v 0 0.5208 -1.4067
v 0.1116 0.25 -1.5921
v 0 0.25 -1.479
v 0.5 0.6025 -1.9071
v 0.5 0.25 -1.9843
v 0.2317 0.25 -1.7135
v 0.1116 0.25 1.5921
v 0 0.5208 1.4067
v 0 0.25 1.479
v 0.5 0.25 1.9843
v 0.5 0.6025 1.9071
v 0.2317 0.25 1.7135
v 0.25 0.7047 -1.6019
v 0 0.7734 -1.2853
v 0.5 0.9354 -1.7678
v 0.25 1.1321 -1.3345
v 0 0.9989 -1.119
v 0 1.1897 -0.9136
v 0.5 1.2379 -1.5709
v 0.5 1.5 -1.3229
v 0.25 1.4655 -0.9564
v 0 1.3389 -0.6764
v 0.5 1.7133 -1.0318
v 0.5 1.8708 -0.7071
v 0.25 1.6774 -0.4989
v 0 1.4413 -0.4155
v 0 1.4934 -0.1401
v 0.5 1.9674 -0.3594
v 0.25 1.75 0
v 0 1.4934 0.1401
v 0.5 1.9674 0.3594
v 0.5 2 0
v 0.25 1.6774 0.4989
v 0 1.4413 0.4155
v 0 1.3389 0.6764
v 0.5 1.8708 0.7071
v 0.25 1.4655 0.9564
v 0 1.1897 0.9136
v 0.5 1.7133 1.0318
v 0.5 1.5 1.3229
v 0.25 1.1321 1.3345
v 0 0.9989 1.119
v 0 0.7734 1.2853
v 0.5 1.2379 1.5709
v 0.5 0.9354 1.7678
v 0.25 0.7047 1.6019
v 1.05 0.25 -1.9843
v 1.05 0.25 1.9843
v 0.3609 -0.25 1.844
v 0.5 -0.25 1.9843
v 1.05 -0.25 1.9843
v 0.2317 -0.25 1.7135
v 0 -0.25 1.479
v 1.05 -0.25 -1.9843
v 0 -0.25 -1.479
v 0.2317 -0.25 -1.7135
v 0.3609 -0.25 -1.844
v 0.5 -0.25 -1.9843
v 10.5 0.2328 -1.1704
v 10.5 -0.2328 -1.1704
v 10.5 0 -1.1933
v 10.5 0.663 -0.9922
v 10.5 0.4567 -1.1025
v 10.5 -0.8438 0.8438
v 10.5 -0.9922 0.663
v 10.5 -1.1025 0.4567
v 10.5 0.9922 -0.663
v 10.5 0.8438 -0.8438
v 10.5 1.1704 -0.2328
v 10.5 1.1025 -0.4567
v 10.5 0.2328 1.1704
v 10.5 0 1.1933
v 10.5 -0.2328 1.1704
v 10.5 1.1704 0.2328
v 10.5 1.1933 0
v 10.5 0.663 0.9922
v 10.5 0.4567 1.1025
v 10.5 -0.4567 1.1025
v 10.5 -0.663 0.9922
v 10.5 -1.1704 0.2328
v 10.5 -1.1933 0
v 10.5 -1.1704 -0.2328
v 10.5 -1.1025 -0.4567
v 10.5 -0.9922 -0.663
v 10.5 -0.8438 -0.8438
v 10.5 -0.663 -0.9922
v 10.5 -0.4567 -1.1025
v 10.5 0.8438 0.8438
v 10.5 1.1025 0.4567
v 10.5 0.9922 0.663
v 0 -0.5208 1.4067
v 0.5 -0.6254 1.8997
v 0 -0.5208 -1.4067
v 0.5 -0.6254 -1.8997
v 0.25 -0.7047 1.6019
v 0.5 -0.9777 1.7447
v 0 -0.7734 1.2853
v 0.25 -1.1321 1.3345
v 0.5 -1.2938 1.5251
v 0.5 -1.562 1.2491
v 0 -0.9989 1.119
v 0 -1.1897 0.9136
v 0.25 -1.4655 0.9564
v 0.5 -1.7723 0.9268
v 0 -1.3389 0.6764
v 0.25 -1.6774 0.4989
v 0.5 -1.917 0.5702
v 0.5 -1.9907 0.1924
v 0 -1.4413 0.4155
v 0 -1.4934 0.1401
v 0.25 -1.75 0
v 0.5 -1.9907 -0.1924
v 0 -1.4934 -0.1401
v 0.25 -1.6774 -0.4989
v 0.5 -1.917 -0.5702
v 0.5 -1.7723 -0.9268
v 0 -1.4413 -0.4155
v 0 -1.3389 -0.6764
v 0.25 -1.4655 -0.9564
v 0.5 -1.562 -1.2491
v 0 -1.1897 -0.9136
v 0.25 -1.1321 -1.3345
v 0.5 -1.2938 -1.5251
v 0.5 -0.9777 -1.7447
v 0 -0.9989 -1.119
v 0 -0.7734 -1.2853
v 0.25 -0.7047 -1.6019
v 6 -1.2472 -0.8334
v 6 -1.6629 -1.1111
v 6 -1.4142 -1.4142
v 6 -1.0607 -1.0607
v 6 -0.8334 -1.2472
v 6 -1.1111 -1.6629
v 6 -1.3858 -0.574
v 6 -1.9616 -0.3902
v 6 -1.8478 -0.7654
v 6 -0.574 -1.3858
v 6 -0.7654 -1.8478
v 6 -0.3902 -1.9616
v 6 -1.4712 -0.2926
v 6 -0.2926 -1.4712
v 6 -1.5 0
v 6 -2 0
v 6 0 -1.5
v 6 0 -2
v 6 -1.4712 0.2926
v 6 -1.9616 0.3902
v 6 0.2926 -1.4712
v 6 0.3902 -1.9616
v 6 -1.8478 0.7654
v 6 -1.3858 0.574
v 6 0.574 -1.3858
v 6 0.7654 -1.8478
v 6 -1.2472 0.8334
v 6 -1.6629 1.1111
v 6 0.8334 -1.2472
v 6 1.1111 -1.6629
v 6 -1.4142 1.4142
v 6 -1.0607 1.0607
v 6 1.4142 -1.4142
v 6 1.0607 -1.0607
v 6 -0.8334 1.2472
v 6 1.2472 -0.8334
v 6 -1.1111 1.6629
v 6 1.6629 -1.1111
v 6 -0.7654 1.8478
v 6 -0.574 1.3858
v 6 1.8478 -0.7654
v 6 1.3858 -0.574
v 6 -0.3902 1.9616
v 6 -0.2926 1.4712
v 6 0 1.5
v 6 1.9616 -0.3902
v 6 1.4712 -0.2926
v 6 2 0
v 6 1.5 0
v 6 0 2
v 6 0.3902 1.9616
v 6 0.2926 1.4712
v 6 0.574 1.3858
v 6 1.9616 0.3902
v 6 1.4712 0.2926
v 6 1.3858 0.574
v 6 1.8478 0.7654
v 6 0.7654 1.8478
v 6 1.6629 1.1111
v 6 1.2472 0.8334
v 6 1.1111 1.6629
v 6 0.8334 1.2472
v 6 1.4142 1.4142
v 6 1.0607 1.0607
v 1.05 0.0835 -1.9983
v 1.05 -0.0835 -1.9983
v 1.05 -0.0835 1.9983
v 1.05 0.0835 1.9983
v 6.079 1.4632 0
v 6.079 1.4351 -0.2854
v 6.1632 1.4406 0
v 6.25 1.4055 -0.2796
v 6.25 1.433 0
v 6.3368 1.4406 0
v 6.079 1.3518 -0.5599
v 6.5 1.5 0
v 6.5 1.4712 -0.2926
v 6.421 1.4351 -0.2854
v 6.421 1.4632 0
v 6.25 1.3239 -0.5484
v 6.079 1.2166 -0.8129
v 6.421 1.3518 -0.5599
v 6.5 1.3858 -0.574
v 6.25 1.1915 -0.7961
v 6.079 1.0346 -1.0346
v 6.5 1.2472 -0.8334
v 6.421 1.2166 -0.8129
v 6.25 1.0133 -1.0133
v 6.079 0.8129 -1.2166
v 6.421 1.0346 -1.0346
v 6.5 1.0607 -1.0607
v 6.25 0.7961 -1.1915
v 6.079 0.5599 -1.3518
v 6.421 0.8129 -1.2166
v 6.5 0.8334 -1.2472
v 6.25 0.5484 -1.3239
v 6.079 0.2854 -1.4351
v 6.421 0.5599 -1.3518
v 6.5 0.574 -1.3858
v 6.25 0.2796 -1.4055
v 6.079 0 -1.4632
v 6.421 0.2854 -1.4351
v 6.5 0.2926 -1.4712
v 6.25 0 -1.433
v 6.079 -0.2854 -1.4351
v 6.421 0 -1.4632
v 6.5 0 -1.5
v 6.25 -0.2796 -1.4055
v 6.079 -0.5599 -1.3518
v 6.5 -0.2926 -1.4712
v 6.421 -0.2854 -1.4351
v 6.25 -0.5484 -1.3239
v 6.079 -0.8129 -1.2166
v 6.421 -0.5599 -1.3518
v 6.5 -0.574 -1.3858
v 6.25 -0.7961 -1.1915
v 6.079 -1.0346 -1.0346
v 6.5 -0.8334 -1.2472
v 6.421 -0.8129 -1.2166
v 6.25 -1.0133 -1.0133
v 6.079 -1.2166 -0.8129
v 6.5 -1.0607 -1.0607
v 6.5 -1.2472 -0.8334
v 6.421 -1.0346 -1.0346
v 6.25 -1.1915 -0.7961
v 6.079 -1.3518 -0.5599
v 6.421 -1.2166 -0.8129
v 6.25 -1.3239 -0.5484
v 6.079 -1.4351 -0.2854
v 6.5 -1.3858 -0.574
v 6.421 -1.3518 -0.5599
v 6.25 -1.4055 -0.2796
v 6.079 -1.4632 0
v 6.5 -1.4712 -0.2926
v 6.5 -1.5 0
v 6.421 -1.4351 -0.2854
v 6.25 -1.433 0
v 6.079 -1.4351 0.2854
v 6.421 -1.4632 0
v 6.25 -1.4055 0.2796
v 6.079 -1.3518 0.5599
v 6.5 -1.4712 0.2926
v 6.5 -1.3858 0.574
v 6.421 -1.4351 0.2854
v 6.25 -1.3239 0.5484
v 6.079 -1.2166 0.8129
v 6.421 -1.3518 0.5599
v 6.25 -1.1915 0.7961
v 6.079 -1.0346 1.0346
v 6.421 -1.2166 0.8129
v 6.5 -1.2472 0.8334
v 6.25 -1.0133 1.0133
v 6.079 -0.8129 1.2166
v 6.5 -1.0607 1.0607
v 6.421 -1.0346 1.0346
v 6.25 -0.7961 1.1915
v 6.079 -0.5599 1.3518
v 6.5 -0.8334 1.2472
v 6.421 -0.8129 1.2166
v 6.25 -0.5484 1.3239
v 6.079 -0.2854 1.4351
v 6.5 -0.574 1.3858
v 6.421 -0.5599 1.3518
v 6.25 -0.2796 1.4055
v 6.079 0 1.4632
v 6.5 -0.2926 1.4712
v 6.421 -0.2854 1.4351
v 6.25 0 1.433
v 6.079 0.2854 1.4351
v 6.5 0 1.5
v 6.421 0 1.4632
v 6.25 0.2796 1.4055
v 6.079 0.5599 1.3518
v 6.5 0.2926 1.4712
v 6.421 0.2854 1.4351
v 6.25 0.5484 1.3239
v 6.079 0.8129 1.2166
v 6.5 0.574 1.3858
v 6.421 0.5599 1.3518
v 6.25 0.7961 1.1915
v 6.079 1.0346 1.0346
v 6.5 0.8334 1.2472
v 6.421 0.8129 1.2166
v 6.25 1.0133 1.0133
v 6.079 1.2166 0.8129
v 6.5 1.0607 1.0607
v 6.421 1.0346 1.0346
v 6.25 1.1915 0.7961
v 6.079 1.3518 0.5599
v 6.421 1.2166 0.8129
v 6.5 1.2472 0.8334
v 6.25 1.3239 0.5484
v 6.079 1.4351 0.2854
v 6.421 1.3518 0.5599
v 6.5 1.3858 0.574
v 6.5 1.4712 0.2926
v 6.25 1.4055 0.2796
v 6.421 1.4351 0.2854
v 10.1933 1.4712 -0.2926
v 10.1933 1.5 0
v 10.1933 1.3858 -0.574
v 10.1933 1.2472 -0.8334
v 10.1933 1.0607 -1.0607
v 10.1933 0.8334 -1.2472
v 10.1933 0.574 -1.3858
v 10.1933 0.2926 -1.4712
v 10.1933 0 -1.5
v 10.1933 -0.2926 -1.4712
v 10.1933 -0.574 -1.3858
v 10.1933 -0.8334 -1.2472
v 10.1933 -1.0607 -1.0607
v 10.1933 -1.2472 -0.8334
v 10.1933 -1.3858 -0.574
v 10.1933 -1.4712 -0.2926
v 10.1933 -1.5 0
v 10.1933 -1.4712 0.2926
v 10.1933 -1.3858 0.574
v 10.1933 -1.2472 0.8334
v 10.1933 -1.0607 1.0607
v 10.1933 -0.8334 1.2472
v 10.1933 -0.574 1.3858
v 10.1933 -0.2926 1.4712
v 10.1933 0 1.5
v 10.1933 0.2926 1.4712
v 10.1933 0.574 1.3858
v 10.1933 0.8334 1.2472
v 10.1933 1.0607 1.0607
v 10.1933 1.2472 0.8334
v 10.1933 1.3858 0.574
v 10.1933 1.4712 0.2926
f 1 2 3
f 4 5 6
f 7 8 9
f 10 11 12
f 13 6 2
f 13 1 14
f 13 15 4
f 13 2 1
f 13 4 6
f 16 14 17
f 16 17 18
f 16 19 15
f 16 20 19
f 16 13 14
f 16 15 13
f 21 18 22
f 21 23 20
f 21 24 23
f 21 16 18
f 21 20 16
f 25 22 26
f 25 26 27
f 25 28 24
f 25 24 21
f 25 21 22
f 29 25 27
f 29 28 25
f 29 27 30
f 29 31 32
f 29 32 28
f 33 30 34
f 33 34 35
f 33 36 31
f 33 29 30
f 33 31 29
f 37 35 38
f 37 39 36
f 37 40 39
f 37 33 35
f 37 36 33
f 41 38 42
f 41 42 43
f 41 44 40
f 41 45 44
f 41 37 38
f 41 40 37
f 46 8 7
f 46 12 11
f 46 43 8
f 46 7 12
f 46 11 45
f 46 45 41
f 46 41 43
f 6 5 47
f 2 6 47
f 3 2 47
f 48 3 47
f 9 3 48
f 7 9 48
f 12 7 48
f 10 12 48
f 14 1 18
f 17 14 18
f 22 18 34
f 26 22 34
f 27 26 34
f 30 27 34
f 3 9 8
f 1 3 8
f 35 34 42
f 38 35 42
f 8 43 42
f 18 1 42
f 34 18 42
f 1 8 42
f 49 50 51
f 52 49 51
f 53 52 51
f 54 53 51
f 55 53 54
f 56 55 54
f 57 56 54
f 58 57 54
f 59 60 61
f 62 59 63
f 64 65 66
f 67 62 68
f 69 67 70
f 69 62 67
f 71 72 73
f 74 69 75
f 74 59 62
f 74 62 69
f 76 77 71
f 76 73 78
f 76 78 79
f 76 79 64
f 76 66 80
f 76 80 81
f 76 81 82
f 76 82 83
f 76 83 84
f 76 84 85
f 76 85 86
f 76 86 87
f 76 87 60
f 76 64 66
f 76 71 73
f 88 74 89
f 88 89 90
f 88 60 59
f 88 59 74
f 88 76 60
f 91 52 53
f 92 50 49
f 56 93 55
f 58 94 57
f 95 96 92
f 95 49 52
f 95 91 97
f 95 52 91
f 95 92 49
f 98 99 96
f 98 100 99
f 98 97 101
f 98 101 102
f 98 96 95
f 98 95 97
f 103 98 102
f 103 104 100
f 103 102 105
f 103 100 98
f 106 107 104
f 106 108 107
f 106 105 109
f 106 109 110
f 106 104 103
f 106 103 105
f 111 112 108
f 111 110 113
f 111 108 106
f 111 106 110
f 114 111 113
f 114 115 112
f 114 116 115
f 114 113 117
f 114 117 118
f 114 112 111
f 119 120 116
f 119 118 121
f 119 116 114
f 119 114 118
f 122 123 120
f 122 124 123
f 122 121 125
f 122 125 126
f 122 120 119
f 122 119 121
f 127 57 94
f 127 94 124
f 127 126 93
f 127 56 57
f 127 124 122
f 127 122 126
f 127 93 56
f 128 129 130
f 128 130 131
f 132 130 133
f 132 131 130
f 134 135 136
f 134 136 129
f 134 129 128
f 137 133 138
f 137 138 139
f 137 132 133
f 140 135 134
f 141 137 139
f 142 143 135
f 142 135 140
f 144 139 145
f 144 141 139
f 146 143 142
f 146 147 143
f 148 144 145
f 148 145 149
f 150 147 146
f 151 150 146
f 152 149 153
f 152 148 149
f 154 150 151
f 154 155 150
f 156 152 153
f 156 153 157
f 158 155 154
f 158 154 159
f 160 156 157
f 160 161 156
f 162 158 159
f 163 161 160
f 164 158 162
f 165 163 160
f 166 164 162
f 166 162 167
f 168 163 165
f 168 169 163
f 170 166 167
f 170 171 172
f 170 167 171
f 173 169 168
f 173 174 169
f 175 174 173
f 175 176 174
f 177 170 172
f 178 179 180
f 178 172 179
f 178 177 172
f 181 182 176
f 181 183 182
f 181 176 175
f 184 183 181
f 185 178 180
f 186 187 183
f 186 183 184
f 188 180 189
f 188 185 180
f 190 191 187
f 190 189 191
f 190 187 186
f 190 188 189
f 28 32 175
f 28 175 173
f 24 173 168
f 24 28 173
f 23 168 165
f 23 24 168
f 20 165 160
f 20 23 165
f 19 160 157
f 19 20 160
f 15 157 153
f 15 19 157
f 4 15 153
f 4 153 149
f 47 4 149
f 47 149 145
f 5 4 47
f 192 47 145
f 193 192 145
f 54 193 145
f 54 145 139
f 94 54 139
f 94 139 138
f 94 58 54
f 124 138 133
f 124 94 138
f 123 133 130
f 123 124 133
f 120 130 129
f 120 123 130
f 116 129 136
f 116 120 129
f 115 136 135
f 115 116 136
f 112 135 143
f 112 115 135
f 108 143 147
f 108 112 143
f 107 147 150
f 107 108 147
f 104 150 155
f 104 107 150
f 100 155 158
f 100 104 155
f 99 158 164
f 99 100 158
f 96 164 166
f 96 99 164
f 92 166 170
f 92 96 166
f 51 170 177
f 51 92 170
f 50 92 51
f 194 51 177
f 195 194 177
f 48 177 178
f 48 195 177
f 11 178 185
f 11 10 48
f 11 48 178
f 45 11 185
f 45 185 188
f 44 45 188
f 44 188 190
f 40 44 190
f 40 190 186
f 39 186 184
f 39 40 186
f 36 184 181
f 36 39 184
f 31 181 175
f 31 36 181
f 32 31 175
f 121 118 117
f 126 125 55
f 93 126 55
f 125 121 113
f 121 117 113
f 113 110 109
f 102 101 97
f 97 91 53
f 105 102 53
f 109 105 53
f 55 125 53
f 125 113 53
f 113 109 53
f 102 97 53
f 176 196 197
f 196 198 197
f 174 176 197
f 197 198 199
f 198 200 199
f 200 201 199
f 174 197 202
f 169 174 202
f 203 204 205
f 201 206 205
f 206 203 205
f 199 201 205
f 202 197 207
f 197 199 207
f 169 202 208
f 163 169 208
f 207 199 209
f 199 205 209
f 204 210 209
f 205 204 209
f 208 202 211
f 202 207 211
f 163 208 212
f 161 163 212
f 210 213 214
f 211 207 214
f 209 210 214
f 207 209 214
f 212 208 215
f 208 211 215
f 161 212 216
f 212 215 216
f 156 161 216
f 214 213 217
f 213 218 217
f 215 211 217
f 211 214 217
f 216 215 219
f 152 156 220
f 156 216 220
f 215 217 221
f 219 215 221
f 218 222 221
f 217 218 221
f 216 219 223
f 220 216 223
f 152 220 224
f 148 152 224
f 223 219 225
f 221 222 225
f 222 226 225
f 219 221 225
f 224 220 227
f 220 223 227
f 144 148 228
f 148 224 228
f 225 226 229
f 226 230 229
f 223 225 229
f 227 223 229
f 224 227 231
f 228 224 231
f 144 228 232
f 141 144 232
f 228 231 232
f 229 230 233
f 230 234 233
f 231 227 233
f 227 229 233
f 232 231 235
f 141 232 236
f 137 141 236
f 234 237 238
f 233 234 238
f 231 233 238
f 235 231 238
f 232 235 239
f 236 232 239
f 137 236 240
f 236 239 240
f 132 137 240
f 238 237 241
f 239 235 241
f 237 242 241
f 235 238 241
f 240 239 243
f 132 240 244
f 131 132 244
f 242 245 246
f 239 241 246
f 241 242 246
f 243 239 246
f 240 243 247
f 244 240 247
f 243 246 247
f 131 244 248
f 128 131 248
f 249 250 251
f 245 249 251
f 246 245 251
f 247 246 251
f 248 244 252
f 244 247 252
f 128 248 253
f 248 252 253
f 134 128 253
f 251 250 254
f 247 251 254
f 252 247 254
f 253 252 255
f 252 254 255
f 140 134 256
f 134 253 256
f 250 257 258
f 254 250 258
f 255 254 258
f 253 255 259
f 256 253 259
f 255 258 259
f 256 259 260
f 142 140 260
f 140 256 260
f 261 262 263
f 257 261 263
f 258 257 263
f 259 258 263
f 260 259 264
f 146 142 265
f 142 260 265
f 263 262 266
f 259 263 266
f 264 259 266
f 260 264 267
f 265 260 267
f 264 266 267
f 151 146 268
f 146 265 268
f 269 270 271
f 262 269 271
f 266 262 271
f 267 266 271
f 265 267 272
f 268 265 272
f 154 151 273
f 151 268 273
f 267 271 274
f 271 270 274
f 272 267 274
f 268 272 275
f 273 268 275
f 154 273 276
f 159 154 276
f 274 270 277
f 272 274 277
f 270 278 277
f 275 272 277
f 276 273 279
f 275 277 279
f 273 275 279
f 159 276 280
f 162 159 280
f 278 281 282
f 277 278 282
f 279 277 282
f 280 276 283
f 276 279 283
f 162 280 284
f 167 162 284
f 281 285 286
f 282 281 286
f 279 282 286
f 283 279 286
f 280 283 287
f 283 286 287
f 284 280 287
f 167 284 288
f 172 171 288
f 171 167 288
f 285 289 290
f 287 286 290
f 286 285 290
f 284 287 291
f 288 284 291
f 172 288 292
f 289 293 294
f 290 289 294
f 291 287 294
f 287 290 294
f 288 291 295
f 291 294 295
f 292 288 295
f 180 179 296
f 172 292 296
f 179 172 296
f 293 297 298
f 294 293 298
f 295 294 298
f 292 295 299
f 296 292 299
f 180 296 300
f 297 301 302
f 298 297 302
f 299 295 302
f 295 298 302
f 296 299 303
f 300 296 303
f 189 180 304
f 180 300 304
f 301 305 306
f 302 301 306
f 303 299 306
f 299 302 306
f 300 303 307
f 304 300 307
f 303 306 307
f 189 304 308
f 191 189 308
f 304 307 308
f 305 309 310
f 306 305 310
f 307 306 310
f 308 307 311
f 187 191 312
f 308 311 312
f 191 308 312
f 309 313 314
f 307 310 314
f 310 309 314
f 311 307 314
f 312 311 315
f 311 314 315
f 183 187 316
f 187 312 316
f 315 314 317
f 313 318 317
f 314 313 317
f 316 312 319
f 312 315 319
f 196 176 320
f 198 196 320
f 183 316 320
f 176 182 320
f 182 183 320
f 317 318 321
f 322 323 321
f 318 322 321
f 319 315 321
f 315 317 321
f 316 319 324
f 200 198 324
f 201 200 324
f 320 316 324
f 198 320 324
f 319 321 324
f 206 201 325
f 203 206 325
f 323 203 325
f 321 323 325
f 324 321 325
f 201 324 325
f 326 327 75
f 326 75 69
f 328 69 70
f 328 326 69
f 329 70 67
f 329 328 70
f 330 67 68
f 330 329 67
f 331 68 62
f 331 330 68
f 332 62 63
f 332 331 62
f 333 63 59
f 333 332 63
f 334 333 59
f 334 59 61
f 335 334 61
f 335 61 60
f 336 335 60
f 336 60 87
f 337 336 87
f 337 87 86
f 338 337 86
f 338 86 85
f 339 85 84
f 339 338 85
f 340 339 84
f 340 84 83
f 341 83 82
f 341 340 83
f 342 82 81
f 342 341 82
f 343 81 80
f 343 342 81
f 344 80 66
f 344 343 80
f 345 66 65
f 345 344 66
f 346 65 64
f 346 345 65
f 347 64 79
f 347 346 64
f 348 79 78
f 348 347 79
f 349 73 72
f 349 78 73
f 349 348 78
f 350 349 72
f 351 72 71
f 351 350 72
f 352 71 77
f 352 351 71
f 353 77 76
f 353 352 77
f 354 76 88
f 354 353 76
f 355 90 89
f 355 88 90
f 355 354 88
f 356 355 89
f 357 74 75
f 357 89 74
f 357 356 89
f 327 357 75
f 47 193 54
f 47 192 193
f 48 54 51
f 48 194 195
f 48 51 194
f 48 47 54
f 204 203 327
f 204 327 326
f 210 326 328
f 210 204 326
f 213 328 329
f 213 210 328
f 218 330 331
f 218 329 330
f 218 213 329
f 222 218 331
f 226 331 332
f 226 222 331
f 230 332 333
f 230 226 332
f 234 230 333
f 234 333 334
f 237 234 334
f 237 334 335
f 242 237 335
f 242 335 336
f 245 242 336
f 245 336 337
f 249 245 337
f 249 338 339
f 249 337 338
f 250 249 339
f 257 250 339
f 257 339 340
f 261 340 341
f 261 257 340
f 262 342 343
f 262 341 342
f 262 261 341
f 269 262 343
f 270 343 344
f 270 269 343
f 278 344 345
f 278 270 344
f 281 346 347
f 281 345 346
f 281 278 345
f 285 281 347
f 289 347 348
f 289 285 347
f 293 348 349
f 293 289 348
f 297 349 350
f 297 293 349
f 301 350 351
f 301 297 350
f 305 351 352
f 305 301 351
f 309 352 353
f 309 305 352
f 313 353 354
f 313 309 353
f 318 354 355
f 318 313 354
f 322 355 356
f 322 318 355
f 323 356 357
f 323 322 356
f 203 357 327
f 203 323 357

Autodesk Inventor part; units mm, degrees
ref_plane "YZ Plane" through (0, 0, 0) normal (1, 0, 0) x (0, 1, 0)
ref_plane "XZ Plane" through (0, 0, 0) normal (0, 1, 0) x (-1, 0, 0)
sketch "Skizze1" plane through (0, 0, 0) normal (0, 0, 1) x (1, 0, 0)
  line L0 (0, 0) -> (10.5, 0)
  line L1 (10.5, 0) -> (10.5, 1.5)
  line L2 (10.5, 1.5) -> (6, 1.5)
  line L3 (6, 1.5) -> (6, 2)
  line L4 (6, 2) -> (0, 2)
  line L5 (0, 2) -> (0, 0)
  line L6 (-2.1, 0) -> (12.6, 0) projected
  line L7 (0, -0.4) -> (0, 2.4) projected
  arc A0 (6, 1.5) -> (6.5, 1.5) centre (6.25, 1.933) ccw
  dimension "d0" = 6
  dimension "d1" = 4.5
  dimension "d2" = 3
  dimension "d3" = 4
  dimension "d14" = 0.5
  dimension "d15" = 0.5
revolve "Körper" add sketch "Skizze1" angle 360 about axis through (0, 0, 0) along (1, 0, 0)
sketch "Skizze2" plane through (0, 0, 0) normal (-1, 0, 0) x (0, 0, 1)
  circle A0 centre (0, 0) radius 2 projected
  line L0 (0, -2.8) -> (0, 2.8) projected
  line L1 (-2.8, 0) -> (2.8, 0) projected
  line L2 (-2, 0.25) -> (2, 0.25)
  line L3 (2, 0.25) -> (2, -0.25)
  line L4 (2, -0.25) -> (-2, -0.25)
  line L5 (-2, -0.25) -> (-2, 0.25)
  line L6 (-2, 0) -> (2, 0) construction
  line L7 (0, 0.25) -> (0, -0.25) construction
  dimension "d5" = 0.5
extrude "Loch" cut sketch "Skizze2" against normal blind 1.05 contours L1 L0 L2 A0 | L3 L4 A0 | A0 L4 L0 L1 | A0 L2 L3 | L1 A0 L2 L0 | L0 L4 A0 L1 | L5 L2 A0 | A0 L4 L5
chamfer "Fase1" distance 0.5 angle 45 3 edges at (0, 1.5, -1.3229) (0, 1.5, 1.3229) (0, -2, 0) measured on face at (4, -0.8596, 1.8058)
thread "Gewinde" size "M3x0.5" class "6g" standard "ISO Metric profile" length 4.5
chamfer "Fase2" distance 0.3067 distance2 0.3067 1 edges at (10.5, -1.5, 0) measured on face at (10.5, -0.533, -0.3123)
revolve "Nut1" cut sketch "Skizze1" angle 360 about axis through (0, 0, 0) along (1, 0, 0) contours A0 L2
ref_plane "Work Plane1" through (8, 0, 0) normal (0, 0, -1) x (1, 0, 0)
equation "\"d0\" = KOH"
equation "\"d1\" = GEL"
equation "\"d2\" = NND"
equation "\"d3\" = KOD"
equation "\"d14\" = SBR"
equation "\"d15\" = SBR"
equation "\"d5\" = SBR"
equation "\"d6\" = STI"
equation "\"d8\" = PHH"
equation "\"d19\" = PHH"
equation "\"d10\" = GEL"
equation "\"d12\" = -0.5 * GD1 + 0.5 * NND"
equation "\"d13\" = GUL"
equation "\"NND\" = 3"
equation "\"GEL\" = 4.5"
equation "\"KOD\" = 4"
equation "\"KOH\" = 6"
equation "\"SBR\" = 0.5"
equation "\"GUL\" = 0.61345 * PTC"
equation "\"PHH\" = 0.5"
equation "\"GD1\" = THREADDIA - 1.2269 * PTC"
equation "\"STI\" = 1.05"
equation "\"THREADDIA\" = 3"
equation "\"TOA\" = 30deg"
equation "\"NLG\" = GEL"
equation "\"PTC\" = 0.5"
equation "\"GAL\" = 0.61345 * PTC"
properties part number "DIN 927 - M3 x 6-14H" material "Stahl, weich"
